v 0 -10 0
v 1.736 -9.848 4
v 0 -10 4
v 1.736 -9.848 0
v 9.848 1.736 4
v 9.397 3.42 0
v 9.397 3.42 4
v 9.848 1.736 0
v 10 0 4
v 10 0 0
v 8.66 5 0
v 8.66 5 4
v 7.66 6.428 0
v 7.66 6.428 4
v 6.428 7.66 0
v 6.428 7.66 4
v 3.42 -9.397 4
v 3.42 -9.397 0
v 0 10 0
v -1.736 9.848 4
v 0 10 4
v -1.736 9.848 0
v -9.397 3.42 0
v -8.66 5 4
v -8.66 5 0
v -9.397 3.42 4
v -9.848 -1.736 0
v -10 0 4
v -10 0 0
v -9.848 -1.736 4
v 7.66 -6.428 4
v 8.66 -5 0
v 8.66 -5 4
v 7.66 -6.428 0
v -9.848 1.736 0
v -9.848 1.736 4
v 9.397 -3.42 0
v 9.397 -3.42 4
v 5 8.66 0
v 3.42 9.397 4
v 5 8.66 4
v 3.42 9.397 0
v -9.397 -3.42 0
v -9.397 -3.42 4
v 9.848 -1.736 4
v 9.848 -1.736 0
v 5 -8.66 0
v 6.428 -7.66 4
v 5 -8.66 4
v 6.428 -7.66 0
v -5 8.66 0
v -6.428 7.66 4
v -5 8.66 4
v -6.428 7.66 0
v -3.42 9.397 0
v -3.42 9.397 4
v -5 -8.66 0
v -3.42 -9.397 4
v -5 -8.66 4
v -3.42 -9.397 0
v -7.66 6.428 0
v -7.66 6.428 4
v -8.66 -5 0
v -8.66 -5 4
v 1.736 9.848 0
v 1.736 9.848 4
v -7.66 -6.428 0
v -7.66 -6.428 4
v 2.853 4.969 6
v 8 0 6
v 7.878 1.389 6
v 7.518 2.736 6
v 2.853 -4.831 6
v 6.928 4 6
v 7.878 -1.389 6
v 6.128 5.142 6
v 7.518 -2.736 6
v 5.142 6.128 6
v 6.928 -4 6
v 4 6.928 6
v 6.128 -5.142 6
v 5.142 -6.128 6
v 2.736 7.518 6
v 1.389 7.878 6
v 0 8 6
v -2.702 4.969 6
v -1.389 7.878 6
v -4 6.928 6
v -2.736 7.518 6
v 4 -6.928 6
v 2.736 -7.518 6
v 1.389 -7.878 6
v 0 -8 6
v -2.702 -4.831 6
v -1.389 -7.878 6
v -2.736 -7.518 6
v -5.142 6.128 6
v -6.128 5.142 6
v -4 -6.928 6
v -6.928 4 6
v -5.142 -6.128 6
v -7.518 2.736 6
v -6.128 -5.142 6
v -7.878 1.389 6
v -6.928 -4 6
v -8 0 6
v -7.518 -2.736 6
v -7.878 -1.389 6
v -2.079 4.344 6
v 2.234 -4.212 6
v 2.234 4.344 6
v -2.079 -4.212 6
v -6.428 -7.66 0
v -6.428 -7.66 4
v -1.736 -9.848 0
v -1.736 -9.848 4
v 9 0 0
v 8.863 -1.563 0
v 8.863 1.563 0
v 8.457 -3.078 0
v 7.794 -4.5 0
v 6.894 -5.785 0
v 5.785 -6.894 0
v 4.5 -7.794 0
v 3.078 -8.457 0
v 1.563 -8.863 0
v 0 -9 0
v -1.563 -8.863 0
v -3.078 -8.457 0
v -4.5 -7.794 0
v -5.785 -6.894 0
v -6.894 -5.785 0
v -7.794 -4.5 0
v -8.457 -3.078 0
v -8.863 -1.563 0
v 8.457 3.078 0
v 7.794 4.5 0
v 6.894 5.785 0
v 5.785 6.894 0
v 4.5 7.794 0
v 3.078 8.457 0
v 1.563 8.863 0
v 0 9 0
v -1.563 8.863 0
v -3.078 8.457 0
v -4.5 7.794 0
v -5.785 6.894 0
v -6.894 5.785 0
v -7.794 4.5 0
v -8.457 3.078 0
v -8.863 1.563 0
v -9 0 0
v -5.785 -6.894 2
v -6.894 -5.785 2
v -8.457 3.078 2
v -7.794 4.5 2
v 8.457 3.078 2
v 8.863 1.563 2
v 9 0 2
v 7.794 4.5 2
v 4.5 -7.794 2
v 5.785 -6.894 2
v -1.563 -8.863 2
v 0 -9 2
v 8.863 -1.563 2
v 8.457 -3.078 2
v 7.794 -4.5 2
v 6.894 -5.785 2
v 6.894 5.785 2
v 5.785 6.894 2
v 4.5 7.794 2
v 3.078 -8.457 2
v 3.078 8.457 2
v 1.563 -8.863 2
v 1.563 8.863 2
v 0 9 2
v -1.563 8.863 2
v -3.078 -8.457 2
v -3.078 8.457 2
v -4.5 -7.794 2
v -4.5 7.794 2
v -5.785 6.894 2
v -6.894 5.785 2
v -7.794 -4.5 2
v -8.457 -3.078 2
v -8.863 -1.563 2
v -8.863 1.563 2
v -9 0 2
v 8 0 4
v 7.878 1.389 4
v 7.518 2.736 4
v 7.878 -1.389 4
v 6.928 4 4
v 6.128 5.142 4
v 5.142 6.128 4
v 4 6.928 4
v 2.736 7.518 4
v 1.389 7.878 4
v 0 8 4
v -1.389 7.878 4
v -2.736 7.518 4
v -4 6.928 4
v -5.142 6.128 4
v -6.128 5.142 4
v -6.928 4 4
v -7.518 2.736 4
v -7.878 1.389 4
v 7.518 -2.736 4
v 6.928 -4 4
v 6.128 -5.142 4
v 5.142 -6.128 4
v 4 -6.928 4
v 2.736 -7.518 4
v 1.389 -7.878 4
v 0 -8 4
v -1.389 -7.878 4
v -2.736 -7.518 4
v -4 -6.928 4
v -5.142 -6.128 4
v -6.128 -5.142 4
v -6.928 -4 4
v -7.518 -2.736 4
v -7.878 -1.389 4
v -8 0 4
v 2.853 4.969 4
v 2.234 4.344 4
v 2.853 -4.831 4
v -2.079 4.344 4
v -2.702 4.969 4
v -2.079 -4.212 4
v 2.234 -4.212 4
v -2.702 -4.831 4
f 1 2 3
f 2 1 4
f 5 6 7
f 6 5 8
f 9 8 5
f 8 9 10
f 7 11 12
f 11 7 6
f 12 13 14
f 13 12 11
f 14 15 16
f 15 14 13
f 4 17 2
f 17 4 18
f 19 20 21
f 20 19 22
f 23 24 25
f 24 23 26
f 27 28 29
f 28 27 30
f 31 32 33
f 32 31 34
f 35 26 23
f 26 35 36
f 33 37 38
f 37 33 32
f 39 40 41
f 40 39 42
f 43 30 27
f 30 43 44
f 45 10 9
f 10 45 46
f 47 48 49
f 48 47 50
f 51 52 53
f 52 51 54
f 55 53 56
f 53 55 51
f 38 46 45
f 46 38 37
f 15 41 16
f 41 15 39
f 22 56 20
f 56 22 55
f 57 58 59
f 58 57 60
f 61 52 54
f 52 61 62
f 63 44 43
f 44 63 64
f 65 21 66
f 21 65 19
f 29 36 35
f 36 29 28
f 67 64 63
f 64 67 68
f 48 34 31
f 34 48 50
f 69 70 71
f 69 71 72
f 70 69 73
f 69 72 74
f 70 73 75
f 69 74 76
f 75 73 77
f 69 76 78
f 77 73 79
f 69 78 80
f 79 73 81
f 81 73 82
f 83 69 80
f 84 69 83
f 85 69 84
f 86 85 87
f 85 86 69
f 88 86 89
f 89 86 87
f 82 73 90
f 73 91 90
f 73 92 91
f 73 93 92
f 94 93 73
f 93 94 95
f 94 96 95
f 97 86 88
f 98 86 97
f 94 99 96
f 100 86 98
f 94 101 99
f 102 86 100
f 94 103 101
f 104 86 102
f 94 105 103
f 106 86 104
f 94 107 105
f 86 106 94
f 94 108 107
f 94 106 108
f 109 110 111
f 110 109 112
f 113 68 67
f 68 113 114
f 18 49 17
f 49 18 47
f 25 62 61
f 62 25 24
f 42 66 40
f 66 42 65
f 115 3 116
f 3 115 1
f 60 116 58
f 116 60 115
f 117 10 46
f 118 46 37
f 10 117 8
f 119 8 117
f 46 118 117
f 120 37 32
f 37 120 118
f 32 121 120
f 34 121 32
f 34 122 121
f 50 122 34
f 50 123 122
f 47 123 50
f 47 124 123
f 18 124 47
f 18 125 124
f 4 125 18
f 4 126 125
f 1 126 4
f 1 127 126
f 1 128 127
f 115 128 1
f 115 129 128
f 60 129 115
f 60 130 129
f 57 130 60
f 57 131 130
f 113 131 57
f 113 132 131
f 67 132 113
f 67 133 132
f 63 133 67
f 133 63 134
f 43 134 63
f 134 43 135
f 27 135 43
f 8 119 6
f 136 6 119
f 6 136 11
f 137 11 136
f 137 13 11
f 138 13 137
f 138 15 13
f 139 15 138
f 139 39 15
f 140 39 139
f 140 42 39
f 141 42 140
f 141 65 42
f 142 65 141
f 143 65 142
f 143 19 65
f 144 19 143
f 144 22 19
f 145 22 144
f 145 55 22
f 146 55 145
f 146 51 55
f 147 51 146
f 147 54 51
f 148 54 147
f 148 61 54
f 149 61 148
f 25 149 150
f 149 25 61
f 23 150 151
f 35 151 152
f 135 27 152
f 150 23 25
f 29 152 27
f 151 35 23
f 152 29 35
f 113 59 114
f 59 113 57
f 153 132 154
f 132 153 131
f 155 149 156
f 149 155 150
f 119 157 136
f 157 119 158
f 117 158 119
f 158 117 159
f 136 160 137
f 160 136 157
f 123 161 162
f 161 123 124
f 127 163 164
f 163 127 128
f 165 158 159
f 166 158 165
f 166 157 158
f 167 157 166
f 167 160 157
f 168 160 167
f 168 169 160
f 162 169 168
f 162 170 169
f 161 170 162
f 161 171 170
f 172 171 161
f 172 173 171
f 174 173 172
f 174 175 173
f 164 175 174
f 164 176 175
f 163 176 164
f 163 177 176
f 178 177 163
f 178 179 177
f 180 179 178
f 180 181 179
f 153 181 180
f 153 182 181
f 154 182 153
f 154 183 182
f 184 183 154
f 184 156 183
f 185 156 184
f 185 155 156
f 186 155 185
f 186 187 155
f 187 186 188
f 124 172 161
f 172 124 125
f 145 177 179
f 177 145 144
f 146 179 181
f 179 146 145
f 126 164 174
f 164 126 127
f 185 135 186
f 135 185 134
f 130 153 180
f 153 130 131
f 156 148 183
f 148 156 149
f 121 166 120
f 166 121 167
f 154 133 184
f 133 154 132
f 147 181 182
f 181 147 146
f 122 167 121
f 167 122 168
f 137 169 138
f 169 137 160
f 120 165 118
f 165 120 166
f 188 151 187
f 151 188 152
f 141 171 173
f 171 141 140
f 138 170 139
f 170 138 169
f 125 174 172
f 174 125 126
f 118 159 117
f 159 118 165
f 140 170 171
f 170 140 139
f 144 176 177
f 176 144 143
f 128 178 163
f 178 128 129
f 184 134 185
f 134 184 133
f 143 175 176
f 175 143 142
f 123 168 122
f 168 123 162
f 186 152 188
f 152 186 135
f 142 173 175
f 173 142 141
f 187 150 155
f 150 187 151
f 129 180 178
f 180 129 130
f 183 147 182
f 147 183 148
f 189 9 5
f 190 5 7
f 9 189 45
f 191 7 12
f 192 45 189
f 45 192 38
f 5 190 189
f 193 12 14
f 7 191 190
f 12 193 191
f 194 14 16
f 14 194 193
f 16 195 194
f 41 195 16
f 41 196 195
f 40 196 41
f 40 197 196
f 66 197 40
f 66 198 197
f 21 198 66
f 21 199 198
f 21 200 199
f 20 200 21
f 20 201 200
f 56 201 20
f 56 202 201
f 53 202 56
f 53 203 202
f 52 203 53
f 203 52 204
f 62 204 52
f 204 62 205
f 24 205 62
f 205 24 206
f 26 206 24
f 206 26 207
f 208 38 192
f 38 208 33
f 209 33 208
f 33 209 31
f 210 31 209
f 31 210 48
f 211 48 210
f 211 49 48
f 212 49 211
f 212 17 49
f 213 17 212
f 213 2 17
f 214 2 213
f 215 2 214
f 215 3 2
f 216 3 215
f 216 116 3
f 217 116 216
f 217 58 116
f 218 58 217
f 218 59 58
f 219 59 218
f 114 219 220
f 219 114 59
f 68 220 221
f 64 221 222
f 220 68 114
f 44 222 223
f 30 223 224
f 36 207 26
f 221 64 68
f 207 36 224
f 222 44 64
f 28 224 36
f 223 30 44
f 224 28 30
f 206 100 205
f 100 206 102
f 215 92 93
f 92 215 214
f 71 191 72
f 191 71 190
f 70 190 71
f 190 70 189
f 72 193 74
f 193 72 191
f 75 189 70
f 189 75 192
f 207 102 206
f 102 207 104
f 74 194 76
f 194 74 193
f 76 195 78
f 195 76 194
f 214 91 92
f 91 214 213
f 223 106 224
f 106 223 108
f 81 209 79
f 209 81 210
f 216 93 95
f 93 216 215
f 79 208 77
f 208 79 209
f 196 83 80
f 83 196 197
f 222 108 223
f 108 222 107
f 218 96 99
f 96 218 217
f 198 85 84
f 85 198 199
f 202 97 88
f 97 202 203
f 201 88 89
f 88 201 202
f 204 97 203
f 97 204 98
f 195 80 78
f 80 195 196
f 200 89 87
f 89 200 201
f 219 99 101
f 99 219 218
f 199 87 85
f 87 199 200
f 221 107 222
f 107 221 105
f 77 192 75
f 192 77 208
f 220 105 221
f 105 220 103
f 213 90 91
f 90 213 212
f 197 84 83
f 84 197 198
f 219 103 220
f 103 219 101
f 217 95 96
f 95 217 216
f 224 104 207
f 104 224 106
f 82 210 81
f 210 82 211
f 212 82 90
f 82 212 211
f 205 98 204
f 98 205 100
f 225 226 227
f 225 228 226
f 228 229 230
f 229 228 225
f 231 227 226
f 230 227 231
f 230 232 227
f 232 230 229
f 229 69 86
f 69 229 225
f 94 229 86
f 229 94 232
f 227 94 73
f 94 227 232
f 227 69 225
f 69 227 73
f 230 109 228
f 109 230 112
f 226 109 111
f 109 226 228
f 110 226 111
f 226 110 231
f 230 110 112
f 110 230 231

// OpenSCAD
difference() {
	difference() {
		difference() {
			cylinder($fn = 36, h = 6, r = 10);
			translate(v = [0, 0, -1]) {
				cylinder($fn = 36, h = 3, r = 9);
			}
		}
		translate(v = [0, 0, 4]) {
			difference() {
				cylinder($fn = 36, h = 3, r = 10.5000000000);
				cylinder($fn = 36, h = 3, r = 8);
			}
		}
	}
	translate(v = [0, 0, 4]) {
		linear_extrude(height = 3) {
			text(font = "mana", halign = "center", size = 8, text = "\uE604", valign = "center");
		}
	}
}
